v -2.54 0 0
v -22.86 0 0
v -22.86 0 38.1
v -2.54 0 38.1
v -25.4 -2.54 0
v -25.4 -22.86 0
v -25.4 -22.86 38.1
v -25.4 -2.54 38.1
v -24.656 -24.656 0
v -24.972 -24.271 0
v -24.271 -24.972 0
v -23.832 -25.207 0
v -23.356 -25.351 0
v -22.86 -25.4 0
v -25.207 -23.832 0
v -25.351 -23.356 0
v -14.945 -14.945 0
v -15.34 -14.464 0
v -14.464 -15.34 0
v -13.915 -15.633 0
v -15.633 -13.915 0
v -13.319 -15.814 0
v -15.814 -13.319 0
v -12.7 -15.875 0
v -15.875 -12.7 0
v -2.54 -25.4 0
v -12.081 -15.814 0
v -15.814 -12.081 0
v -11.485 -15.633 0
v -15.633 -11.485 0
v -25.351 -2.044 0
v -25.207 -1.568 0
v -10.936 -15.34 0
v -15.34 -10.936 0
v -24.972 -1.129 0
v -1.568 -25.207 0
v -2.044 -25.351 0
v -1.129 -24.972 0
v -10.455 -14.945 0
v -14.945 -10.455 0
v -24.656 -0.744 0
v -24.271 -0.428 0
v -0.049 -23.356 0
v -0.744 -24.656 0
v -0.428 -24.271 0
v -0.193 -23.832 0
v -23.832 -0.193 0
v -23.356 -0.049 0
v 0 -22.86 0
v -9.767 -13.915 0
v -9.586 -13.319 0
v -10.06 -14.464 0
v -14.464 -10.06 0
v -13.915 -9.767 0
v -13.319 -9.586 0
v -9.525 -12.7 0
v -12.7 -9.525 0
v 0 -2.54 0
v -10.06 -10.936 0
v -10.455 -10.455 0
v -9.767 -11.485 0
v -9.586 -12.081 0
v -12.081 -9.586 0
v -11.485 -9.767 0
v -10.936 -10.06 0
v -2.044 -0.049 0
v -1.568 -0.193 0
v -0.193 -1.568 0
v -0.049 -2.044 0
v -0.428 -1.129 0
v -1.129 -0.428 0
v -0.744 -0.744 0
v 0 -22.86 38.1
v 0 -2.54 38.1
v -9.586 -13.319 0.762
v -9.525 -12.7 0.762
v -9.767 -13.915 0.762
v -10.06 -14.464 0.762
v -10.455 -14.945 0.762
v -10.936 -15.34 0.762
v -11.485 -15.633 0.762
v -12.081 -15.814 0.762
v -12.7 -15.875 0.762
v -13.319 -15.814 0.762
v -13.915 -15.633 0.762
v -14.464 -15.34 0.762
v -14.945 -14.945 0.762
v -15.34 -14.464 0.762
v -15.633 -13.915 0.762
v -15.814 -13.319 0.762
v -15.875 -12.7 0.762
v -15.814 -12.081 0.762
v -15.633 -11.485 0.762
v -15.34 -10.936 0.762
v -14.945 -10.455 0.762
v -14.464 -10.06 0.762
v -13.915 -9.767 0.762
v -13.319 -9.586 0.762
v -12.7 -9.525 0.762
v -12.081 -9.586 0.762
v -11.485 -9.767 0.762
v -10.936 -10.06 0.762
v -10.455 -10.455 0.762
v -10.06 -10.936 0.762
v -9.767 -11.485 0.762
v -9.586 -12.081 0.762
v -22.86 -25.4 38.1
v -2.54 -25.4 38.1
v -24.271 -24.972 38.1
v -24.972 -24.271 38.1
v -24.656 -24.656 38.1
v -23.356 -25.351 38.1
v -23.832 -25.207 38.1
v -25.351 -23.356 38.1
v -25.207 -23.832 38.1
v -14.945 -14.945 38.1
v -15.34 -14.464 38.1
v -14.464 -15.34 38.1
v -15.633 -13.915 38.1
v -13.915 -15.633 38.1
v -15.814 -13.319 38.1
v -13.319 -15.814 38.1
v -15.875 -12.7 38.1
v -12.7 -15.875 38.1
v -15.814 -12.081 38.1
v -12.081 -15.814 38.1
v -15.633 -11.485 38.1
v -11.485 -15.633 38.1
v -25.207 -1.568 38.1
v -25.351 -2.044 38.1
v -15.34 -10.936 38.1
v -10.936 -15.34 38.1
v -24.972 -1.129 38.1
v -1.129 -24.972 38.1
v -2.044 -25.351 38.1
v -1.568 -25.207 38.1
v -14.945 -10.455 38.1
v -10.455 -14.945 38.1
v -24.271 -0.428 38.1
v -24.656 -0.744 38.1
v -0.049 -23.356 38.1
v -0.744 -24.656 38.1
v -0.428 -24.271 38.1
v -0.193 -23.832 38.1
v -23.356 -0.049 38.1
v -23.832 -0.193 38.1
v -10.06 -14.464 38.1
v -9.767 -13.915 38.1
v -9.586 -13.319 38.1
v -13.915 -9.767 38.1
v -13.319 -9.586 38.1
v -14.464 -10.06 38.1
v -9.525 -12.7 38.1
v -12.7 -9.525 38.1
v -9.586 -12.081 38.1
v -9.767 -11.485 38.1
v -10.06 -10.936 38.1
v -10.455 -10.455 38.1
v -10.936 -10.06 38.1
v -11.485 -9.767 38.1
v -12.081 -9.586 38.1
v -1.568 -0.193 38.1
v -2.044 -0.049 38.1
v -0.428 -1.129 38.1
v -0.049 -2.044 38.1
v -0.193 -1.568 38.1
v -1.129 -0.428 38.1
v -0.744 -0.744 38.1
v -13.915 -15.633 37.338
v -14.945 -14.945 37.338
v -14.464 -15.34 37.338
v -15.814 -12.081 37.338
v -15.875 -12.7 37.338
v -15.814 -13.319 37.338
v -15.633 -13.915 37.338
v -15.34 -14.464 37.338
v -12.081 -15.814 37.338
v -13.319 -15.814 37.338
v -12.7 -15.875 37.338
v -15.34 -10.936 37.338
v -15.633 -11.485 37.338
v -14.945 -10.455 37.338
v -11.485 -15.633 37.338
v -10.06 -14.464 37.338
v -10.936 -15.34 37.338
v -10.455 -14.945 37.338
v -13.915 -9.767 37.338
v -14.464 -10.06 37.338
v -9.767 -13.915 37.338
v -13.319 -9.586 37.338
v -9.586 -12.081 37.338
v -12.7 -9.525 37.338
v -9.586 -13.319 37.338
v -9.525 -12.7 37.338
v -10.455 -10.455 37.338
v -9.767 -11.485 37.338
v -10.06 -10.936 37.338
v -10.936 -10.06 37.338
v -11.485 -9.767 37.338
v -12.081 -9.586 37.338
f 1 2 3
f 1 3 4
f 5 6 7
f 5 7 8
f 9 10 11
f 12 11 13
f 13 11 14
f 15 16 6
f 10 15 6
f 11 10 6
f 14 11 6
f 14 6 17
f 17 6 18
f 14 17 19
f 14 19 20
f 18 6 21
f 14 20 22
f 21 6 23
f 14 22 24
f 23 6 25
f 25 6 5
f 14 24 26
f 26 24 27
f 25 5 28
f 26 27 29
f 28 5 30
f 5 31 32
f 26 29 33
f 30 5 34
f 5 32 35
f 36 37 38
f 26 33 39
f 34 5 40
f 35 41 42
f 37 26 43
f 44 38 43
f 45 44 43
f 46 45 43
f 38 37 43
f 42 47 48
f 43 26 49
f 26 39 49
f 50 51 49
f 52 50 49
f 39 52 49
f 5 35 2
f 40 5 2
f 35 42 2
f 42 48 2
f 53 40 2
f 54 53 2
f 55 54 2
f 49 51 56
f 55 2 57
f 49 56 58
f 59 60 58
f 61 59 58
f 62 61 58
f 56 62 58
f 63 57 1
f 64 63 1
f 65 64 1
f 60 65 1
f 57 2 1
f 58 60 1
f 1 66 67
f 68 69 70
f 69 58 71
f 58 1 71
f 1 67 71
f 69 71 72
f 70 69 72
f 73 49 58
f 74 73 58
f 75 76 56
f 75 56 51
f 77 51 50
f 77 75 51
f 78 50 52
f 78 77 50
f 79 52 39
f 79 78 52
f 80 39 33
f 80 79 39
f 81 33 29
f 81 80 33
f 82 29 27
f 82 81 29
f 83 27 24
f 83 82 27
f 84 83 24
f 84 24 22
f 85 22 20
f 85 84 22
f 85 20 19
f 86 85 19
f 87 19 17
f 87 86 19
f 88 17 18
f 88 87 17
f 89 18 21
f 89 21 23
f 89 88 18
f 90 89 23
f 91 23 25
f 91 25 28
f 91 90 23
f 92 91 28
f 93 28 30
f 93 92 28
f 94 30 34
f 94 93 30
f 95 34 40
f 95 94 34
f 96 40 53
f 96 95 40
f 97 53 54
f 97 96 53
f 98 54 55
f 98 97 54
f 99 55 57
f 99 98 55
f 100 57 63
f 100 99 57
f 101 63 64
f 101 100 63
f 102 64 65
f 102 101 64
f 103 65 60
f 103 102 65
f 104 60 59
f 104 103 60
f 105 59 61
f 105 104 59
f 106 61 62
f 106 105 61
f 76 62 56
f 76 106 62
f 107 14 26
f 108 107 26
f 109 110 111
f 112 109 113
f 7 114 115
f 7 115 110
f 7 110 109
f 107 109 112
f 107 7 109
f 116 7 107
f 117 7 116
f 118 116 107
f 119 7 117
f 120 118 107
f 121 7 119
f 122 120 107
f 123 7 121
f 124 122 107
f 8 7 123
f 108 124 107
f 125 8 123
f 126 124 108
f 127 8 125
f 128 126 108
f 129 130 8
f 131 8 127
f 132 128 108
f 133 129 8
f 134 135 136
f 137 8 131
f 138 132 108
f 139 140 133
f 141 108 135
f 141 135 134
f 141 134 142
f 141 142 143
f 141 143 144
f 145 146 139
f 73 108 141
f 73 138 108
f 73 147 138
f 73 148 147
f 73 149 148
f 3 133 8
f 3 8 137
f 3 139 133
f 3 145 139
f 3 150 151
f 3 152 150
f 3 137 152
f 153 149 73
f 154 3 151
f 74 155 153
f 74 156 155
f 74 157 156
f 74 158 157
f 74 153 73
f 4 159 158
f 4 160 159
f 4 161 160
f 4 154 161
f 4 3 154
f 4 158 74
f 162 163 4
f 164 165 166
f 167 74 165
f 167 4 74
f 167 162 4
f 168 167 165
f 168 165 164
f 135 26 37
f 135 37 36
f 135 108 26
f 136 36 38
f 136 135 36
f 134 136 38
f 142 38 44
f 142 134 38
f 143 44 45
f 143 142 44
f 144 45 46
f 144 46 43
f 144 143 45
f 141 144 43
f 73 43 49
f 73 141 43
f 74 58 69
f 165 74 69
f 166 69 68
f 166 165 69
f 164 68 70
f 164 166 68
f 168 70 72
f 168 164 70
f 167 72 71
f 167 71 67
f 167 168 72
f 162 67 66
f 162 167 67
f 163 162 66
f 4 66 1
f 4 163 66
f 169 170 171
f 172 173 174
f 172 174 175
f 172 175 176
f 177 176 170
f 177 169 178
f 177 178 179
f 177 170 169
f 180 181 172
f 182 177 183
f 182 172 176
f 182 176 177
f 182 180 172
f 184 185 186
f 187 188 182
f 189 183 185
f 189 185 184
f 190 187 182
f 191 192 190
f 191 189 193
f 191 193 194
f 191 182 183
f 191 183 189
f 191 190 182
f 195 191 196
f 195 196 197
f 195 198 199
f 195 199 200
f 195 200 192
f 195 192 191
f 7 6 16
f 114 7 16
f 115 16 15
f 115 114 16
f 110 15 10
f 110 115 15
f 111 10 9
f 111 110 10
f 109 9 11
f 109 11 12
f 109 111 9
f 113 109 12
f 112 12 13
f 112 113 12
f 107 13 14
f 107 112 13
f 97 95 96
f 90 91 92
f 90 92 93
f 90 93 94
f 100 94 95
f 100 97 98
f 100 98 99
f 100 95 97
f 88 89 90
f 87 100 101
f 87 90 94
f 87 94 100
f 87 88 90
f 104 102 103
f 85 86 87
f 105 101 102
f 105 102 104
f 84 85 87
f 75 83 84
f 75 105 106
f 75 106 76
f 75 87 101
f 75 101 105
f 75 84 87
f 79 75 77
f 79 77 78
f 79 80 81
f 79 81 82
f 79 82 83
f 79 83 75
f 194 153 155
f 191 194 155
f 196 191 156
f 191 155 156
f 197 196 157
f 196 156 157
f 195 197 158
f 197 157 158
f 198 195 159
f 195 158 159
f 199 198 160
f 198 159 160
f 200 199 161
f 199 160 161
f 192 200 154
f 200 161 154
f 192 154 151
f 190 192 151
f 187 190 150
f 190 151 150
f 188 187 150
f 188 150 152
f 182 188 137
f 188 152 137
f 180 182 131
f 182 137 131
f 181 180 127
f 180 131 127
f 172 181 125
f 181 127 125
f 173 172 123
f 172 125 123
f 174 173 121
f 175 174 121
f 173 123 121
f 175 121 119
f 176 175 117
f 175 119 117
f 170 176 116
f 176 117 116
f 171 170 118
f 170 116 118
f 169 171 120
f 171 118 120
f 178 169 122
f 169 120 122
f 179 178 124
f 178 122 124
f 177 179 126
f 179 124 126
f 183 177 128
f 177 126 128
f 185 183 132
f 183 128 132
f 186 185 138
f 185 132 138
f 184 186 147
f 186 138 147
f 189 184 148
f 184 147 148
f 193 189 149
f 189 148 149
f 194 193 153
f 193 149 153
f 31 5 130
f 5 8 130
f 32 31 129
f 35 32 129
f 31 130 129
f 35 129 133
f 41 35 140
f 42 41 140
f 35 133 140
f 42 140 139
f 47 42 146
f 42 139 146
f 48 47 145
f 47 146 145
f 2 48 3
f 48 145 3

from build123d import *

# Parameters (mm, degrees)
SKETCH2_W           = 25.4
SKETCH2_H           = 25.4
BOSS_EXTRUDE1_DEPTH = 38.1
FILLET2_R           = 2.54
SKETCH4_R           = 3.175
CUT_EXTRUDE1_DEPTH  = 0.762
CUT_EXTRUDE2_START  = -0.762
SKETCH5_R           = 3.175
CUT_EXTRUDE2_DEPTH  = 0.762


with BuildPart() as part:
    # Sketch2 → Boss-Extrude1 (new body)
    with BuildSketch(Plane.XY):
        with Locations((-12.7, -12.7)):
            Rectangle(SKETCH2_W, SKETCH2_H)
    extrude(amount=BOSS_EXTRUDE1_DEPTH)

    # Fillet2
    fillet2_edges = [part.edges().sort_by_distance(p)[0] for p in [
        (0, -25.4, 19.05),
        (-25.4, -25.4, 19.05),
        (-25.4, 0, 19.05),
        (0, 0, 19.05),
    ]]
    fillet(fillet2_edges, radius=FILLET2_R)

    # Sketch4 → Cut-Extrude1 (cut)
    with BuildSketch(Plane.XY.offset(38.1)):
        with Locations((-12.7, -12.7)):
            Circle(SKETCH4_R)
    extrude(amount=-CUT_EXTRUDE1_DEPTH, mode=Mode.SUBTRACT)

    # Sketch5 → Cut-Extrude2 (cut)
    with BuildSketch(Plane(origin=(0, 0, 0), x_dir=(-1, 0, 0), z_dir=(0, 0, -1)).offset(CUT_EXTRUDE2_START)):
        with Locations(Location((12.7, -12.7, 0), (0, 0, 180))):
            Circle(SKETCH5_R)
    extrude(amount=CUT_EXTRUDE2_DEPTH, mode=Mode.SUBTRACT)


solid = part.part
